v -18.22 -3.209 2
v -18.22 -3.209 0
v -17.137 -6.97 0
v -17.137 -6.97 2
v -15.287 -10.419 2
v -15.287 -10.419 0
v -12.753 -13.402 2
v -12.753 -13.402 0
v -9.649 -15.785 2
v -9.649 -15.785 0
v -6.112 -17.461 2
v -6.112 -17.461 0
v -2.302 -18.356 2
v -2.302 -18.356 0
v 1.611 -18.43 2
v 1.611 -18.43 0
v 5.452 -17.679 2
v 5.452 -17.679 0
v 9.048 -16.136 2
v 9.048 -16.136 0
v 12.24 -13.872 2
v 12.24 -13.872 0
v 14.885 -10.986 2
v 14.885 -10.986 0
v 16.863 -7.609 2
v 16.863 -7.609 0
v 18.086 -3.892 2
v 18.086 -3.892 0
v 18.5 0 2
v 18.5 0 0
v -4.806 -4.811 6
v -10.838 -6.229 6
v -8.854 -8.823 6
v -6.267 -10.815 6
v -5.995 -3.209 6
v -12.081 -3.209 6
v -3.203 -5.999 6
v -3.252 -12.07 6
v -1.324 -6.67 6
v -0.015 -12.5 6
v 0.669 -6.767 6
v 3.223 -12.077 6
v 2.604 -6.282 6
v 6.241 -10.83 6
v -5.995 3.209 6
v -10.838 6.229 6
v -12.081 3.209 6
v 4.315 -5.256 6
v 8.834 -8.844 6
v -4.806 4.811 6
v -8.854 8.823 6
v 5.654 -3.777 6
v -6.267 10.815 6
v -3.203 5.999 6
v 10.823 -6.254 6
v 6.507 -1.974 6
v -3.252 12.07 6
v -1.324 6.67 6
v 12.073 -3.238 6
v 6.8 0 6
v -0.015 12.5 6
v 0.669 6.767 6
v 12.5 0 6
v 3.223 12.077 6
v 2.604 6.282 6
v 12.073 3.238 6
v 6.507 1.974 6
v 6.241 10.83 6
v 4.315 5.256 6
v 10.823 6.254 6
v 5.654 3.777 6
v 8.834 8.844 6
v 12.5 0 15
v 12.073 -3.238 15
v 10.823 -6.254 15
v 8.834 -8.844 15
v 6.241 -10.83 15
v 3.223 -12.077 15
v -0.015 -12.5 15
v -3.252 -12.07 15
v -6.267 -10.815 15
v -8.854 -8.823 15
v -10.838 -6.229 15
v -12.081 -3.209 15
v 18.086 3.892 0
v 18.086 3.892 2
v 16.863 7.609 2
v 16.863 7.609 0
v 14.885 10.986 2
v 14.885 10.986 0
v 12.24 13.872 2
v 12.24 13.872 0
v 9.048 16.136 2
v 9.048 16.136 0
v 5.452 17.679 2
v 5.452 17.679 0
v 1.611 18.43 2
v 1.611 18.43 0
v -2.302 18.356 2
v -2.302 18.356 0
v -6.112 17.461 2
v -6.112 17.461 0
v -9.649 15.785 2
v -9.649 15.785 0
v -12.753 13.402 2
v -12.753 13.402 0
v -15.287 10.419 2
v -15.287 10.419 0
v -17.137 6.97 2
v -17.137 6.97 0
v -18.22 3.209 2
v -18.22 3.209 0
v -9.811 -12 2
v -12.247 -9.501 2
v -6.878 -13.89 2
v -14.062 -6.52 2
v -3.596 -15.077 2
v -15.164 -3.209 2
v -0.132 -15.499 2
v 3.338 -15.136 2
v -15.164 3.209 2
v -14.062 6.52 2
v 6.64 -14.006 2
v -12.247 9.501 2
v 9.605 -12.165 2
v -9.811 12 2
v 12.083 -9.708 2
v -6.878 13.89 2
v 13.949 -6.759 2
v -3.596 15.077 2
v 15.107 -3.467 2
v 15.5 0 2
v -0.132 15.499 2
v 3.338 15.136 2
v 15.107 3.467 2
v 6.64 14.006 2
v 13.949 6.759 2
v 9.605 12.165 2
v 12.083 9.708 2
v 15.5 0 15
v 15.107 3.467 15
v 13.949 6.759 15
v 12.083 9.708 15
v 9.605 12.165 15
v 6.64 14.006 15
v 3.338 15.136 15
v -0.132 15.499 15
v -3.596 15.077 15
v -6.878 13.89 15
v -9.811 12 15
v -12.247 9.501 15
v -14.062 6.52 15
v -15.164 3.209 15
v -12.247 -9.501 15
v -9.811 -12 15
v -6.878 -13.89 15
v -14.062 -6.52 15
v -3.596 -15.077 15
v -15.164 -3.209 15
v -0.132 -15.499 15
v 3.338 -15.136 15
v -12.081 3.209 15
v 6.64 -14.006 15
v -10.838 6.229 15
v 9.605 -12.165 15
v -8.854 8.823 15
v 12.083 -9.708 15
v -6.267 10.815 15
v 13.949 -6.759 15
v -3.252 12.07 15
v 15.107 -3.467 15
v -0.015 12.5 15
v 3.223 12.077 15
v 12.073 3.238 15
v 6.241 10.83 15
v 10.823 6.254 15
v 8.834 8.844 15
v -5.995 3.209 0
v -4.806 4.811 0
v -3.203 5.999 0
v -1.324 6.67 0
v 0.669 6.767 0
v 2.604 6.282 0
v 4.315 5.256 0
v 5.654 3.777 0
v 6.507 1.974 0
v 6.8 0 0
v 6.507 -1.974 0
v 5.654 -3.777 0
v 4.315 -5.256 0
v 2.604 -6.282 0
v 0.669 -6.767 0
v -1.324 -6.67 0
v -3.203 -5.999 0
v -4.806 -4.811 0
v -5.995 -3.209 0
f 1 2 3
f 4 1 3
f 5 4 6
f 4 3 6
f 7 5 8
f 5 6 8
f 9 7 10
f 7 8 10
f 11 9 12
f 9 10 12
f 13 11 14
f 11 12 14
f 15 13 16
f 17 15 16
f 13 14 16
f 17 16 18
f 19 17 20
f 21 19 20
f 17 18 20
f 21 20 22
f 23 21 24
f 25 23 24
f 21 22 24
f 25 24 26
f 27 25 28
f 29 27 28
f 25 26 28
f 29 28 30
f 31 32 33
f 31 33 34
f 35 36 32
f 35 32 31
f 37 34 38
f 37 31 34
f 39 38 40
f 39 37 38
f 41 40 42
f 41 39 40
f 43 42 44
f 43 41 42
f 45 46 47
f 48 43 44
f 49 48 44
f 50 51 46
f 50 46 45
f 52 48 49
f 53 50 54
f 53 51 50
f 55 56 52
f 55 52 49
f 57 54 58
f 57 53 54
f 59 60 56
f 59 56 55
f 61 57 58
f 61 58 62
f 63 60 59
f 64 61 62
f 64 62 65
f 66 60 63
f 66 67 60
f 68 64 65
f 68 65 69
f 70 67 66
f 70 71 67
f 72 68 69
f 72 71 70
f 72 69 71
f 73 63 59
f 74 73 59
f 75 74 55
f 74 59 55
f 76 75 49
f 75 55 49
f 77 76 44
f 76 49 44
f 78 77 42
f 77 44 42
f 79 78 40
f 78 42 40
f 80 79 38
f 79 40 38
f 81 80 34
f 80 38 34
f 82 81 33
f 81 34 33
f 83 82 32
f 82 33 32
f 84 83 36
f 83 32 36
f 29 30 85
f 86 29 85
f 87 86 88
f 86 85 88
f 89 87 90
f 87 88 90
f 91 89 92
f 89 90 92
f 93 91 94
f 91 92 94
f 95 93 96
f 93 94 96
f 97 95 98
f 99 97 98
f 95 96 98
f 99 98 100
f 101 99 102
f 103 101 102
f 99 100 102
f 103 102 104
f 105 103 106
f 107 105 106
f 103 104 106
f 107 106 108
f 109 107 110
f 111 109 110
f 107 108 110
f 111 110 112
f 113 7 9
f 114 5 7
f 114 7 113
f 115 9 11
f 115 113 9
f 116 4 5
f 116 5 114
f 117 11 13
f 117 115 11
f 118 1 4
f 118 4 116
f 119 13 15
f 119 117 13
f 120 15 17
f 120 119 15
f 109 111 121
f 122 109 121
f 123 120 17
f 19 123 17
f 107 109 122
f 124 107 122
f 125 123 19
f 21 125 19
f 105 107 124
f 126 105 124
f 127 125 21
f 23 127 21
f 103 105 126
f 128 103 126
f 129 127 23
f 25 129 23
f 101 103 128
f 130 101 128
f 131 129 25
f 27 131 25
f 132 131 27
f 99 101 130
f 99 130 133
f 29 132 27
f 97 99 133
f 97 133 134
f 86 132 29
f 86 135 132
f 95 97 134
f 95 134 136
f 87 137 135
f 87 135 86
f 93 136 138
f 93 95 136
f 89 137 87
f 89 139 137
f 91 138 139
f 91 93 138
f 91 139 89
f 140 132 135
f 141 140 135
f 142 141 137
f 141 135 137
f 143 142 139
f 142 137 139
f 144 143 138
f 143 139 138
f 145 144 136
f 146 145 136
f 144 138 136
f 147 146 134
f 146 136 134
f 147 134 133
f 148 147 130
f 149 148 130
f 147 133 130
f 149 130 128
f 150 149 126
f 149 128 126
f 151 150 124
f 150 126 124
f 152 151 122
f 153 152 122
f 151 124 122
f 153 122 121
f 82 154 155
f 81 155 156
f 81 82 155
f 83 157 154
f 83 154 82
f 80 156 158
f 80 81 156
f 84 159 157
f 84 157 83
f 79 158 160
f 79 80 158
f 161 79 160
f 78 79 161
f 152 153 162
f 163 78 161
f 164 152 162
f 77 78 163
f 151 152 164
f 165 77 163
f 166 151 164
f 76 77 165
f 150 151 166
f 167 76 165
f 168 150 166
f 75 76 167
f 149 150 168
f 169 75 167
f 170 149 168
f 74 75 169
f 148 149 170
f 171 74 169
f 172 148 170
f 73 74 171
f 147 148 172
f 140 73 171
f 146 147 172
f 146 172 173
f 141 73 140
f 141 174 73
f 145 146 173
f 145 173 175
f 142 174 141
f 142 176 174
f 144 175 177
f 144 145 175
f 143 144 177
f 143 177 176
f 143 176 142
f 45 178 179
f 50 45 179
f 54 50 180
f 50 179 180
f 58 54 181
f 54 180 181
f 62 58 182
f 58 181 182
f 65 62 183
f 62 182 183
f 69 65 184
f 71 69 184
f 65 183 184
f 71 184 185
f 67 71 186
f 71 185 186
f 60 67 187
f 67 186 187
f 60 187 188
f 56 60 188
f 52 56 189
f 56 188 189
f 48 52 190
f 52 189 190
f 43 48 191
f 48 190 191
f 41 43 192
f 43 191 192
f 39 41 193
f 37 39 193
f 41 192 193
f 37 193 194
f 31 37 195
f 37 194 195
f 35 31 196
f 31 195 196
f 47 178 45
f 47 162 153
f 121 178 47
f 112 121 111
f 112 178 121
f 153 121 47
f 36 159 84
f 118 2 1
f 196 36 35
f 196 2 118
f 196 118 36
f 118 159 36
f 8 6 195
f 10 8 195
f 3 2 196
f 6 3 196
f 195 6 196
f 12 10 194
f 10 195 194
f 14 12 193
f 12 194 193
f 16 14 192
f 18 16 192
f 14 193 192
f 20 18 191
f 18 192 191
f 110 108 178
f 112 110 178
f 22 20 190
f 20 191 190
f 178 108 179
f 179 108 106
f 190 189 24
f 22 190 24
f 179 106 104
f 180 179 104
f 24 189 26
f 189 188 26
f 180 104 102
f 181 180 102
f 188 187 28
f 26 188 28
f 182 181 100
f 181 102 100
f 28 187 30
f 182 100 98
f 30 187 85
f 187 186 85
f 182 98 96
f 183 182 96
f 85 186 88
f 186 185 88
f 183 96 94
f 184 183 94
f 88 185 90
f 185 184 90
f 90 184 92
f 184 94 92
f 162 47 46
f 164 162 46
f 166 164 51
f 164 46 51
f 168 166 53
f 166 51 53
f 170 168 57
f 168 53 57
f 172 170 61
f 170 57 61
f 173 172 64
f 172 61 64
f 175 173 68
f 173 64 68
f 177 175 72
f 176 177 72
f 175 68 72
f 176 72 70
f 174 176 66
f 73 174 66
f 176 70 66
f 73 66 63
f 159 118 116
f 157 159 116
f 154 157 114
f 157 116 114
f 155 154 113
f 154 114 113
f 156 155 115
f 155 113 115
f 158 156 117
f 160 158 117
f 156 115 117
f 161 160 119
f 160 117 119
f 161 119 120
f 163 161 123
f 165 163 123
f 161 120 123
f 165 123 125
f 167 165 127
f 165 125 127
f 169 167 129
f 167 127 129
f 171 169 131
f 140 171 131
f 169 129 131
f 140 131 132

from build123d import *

# Parameters (mm, degrees)
F1_DEPTH = 2
F2_DEPTH = 15
F3_DEPTH = 6
F4_DEPTH = 23.4


with BuildPart() as f1:
    # F0 (on Top) → F1 (new body)
    with BuildSketch(Plane.XY):
        with BuildLine():
            ThreePointArc((-15.1641591538, -3.2090928871), (-15.5, 0), (-15.1641591538, 3.2090928871))
            Line((-15.1641591538, 3.2090928871), (-18.2195423335, 3.2090928871))
            ThreePointArc((-18.2195423335, 3.2090928871), (-18.5, 0), (-18.2195423335, -3.2090928871))
            Line((-18.2195423335, -3.2090928871), (-15.1641591538, -3.2090928871))
        make_face()
        with BuildLine():
            Line((-18.2195423335, 3.2090928871), (-15.1641591538, 3.2090928871))
            ThreePointArc((-15.1641591538, 3.2090928871), (1.6133091948, 15.415811151), (15.5, 0))
            ThreePointArc((15.5, 0), (1.6133091948, -15.415811151), (-15.1641591538, -3.2090928871))
            Line((-15.1641591538, -3.2090928871), (-18.2195423335, -3.2090928871))
            ThreePointArc((-18.2195423335, -3.2090928871), (1.610662415, -18.4297522117), (18.5, 0))
            ThreePointArc((18.5, 0), (1.610662415, 18.4297522117), (-18.2195423335, 3.2090928871))
        make_face()
    extrude(amount=F1_DEPTH)

    # F0 (on Top) → F2 (join)
    with BuildSketch(Plane.XY):
        with BuildLine():
            ThreePointArc((-12.0810480854, -3.2090928871), (-12.5, 0), (-12.0810480854, 3.2090928871))
            Line((-12.0810480854, 3.2090928871), (-15.1641591538, 3.2090928871))
            ThreePointArc((-15.1641591538, 3.2090928871), (-15.5, 0), (-15.1641591538, -3.2090928871))
            Line((-15.1641591538, -3.2090928871), (-12.0810480854, -3.2090928871))
        make_face()
        with BuildLine():
            Line((-15.1641591538, 3.2090928871), (-12.0810480854, 3.2090928871))
            ThreePointArc((-12.0810480854, 3.2090928871), (1.6181623733, 12.3948195039), (12.5, 0))
            ThreePointArc((12.5, 0), (1.6181623733, -12.3948195039), (-12.0810480854, -3.2090928871))
            Line((-12.0810480854, -3.2090928871), (-15.1641591538, -3.2090928871))
            ThreePointArc((-15.1641591538, -3.2090928871), (1.6133091948, -15.415811151), (15.5, 0))
            ThreePointArc((15.5, 0), (1.6133091948, 15.415811151), (-15.1641591538, 3.2090928871))
        make_face()
    extrude(amount=F2_DEPTH)

    # F0 (on Top) → F3 (join)
    with BuildSketch(Plane.XY):
        with BuildLine():
            ThreePointArc((-5.9951416032, -3.2090928871), (-6.8, 0), (-5.9951416032, 3.2090928871))
            Line((-5.9951416032, 3.2090928871), (-12.0810480854, 3.2090928871))
            ThreePointArc((-12.0810480854, 3.2090928871), (-12.5, 0), (-12.0810480854, -3.2090928871))
            Line((-12.0810480854, -3.2090928871), (-5.9951416032, -3.2090928871))
        make_face()
        with BuildLine():
            ThreePointArc((-5.9951416032, 3.2090928871), (1.6542425908, 6.595716902), (6.8, 0))
            ThreePointArc((6.8, 0), (1.6542425908, -6.595716902), (-5.9951416032, -3.2090928871))
            Line((-5.9951416032, -3.2090928871), (-12.0810480854, -3.2090928871))
            ThreePointArc((-12.0810480854, -3.2090928871), (1.6181623733, -12.3948195039), (12.5, 0))
            ThreePointArc((12.5, 0), (1.6181623733, 12.3948195039), (-12.0810480854, 3.2090928871))
            Line((-12.0810480854, 3.2090928871), (-5.9951416032, 3.2090928871))
        make_face()
    extrude(amount=F3_DEPTH)

    # F0 (on Top) → F4 (cut)
    with BuildSketch(Plane.XY):
        with BuildLine():
            ThreePointArc((-18.2195423335, -3.2090928871), (-18.5, 0), (-18.2195423335, 3.2090928871))
            Line((-18.2195423335, 3.2090928871), (-24.5871795341, 3.2090928871))
            Line((-24.5871795341, 3.2090928871), (-24.5871795341, -3.2090928871))
            Line((-24.5871795341, -3.2090928871), (-18.2195423335, -3.2090928871))
        make_face()
        with BuildLine():
            ThreePointArc((-5.9951416032, -3.2090928871), (-6.8, 0), (-5.9951416032, 3.2090928871))
            Line((-5.9951416032, 3.2090928871), (-12.0810480854, 3.2090928871))
            ThreePointArc((-12.0810480854, 3.2090928871), (-12.5, 0), (-12.0810480854, -3.2090928871))
            Line((-12.0810480854, -3.2090928871), (-5.9951416032, -3.2090928871))
        make_face()
        with BuildLine():
            ThreePointArc((-15.1641591538, -3.2090928871), (-15.5, 0), (-15.1641591538, 3.2090928871))
            Line((-15.1641591538, 3.2090928871), (-18.2195423335, 3.2090928871))
            ThreePointArc((-18.2195423335, 3.2090928871), (-18.5, 0), (-18.2195423335, -3.2090928871))
            Line((-18.2195423335, -3.2090928871), (-15.1641591538, -3.2090928871))
        make_face()
        with BuildLine():
            ThreePointArc((-12.0810480854, -3.2090928871), (-12.5, 0), (-12.0810480854, 3.2090928871))
            Line((-12.0810480854, 3.2090928871), (-15.1641591538, 3.2090928871))
            ThreePointArc((-15.1641591538, 3.2090928871), (-15.5, 0), (-15.1641591538, -3.2090928871))
            Line((-15.1641591538, -3.2090928871), (-12.0810480854, -3.2090928871))
        make_face()
    extrude(amount=F4_DEPTH, mode=Mode.SUBTRACT)


solid = f1.part
